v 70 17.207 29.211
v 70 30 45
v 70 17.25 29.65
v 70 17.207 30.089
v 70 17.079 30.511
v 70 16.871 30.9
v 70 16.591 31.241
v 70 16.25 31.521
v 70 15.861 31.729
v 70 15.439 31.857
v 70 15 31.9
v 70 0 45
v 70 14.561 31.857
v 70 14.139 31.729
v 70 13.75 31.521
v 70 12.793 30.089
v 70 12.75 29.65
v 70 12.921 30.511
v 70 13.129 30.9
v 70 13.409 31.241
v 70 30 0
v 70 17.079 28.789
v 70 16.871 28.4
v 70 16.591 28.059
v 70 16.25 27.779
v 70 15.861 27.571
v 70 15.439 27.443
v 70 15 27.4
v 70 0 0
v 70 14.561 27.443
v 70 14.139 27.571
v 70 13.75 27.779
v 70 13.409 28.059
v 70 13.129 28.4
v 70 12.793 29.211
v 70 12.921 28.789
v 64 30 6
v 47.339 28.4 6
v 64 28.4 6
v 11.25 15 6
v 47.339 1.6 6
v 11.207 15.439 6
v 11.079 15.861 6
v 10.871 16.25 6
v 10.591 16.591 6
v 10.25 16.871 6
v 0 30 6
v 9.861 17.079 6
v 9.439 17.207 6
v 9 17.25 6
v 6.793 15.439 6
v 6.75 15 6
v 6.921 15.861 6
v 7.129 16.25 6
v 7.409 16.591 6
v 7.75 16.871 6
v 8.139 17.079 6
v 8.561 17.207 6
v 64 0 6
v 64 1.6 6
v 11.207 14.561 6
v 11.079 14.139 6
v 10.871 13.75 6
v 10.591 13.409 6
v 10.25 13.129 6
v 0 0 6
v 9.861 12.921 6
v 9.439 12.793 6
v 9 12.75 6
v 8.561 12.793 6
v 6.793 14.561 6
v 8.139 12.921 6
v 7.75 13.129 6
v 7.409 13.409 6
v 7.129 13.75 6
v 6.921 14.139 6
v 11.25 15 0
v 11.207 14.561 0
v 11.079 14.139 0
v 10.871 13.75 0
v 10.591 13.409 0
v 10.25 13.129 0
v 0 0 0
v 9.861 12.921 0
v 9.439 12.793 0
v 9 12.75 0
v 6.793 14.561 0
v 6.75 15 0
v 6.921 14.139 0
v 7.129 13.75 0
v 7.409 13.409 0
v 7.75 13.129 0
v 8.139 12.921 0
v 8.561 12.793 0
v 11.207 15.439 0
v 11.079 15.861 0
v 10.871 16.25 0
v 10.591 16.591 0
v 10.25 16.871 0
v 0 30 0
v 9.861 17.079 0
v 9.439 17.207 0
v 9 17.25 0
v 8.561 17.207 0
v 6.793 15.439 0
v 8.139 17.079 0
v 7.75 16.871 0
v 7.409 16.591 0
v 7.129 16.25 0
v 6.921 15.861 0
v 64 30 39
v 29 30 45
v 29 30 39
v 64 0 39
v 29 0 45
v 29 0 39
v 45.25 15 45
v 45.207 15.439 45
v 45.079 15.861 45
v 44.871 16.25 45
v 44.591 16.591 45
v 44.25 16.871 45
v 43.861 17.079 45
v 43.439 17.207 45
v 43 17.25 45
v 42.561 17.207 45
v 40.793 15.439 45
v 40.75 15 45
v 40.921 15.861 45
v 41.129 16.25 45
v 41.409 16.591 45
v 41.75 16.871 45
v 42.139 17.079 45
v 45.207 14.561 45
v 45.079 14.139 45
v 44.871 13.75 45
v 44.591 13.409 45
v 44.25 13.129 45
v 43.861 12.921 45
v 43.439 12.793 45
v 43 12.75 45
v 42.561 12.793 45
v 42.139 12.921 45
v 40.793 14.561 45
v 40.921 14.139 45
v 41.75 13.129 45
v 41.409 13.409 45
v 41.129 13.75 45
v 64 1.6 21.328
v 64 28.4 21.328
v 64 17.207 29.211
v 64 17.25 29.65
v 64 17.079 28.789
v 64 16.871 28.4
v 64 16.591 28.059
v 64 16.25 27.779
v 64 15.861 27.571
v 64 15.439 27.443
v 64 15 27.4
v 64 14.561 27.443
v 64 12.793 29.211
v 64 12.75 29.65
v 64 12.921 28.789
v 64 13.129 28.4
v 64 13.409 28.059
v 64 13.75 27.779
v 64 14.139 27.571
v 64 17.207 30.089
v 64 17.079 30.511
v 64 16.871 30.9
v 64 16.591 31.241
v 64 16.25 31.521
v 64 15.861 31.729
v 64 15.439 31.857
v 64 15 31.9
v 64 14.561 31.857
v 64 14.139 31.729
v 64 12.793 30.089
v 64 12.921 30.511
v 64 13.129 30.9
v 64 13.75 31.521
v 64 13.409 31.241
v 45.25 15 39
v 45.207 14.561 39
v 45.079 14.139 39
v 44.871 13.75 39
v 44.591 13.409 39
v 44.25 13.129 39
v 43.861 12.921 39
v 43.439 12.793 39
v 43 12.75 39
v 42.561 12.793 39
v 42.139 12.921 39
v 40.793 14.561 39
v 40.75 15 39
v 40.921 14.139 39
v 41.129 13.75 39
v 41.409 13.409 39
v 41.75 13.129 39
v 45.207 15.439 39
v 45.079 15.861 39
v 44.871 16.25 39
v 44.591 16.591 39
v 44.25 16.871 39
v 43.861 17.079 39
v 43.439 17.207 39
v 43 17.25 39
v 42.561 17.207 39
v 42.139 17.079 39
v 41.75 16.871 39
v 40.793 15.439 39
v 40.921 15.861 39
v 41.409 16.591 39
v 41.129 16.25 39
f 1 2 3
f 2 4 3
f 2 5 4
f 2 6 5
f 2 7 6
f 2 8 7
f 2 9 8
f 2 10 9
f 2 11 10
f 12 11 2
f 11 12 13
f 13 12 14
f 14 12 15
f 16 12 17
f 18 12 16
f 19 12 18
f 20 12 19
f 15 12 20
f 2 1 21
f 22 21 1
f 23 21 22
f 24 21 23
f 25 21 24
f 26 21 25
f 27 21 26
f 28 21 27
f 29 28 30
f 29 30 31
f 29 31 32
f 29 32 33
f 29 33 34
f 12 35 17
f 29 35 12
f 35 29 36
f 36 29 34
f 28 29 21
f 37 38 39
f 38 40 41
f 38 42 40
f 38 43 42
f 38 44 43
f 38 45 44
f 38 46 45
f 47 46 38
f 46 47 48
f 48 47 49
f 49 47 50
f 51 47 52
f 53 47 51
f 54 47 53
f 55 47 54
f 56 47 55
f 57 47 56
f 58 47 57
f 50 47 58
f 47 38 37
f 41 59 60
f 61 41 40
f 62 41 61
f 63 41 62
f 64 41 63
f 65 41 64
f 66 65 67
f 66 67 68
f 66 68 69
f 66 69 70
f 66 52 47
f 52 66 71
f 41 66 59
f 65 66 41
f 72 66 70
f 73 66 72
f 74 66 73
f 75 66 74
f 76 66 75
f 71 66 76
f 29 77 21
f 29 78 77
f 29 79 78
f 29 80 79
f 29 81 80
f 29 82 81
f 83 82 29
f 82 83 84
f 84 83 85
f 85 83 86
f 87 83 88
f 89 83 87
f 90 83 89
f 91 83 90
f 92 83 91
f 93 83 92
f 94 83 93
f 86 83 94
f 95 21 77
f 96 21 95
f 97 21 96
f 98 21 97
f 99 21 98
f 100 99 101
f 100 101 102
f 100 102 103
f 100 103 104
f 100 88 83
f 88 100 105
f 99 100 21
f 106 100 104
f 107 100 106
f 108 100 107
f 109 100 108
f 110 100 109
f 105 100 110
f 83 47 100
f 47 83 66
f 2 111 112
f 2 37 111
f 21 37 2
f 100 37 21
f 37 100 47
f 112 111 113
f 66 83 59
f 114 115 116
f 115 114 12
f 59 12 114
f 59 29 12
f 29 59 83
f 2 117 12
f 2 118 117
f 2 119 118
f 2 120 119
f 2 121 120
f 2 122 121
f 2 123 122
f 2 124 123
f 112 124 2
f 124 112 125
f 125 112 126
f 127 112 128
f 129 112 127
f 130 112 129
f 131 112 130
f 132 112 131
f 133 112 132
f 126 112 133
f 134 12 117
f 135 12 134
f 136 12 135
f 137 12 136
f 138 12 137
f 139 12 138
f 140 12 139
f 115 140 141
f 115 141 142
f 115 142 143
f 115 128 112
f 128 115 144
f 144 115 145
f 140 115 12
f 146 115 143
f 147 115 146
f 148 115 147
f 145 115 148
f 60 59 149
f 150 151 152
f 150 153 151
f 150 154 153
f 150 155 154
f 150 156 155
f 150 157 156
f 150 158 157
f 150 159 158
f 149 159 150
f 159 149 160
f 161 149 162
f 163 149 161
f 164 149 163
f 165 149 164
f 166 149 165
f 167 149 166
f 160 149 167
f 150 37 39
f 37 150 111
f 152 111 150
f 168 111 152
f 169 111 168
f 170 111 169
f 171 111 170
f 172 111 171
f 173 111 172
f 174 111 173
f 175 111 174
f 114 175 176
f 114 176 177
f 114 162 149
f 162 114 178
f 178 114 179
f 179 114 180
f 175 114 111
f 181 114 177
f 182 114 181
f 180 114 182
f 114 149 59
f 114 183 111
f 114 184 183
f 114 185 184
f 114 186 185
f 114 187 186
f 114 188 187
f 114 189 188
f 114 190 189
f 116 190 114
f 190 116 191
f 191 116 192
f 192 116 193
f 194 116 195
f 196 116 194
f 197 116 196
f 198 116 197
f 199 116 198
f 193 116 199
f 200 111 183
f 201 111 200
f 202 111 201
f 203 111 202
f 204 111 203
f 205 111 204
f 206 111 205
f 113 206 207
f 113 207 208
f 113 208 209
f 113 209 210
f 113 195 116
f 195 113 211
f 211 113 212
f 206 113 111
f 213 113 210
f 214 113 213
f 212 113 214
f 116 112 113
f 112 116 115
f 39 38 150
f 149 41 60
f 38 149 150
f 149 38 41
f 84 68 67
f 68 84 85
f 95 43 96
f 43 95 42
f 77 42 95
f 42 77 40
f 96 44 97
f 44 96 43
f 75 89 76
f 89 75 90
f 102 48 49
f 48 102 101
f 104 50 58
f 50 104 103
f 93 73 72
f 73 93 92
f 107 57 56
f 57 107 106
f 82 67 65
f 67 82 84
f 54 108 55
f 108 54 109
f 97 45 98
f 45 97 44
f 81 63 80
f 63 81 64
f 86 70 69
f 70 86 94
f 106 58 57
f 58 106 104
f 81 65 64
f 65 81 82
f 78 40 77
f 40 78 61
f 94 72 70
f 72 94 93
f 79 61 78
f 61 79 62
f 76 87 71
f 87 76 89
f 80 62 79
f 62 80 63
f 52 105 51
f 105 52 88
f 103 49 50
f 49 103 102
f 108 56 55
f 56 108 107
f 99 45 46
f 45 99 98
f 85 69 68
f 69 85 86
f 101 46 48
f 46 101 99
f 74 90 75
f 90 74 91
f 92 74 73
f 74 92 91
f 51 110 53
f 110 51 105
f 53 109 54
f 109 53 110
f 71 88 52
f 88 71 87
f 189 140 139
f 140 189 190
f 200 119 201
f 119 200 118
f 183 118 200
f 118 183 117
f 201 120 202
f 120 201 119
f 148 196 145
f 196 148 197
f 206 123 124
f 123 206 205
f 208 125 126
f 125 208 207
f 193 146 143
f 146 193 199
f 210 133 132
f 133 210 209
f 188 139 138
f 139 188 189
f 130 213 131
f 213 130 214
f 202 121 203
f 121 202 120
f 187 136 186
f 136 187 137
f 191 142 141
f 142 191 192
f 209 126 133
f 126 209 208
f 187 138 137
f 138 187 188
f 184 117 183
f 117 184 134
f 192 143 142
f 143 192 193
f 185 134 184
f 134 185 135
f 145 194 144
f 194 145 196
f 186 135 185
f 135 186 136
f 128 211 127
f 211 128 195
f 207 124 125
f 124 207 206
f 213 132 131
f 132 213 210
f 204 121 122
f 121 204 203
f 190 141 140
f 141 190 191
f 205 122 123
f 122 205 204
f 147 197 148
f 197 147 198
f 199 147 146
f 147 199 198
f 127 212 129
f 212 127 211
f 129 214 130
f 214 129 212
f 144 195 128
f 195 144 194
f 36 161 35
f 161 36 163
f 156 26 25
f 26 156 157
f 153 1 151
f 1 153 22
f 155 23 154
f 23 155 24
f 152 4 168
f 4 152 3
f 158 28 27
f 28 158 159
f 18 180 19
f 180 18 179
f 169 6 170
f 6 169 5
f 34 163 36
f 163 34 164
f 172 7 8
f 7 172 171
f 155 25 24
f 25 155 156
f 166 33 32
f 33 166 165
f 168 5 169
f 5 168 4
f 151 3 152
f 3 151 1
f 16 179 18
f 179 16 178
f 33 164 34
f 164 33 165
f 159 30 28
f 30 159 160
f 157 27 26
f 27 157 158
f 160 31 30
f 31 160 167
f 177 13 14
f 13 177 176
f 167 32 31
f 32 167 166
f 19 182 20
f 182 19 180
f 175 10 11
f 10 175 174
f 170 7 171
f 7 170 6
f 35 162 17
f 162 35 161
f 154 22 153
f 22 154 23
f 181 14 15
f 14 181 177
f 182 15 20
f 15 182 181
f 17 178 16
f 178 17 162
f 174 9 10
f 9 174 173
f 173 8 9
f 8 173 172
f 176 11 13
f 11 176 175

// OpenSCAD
$fn = 32;

// ----------------------------------------------------------------------
// Z-bracket: 70 x 30 x 45 mm
// ----------------------------------------------------------------------

// --- parameters (mm) ---
foot_len = 70;            // lower foot length, X
top_len = 35;             // upper foot length, X
depth = 30;               // bracket width, Y
step_h = 45;              // overall rise, Z
plate_t = 6;              // plate thickness
hole_d = 4.5;             // clearance for M4
rib_len = 18.4;           // gusset leg
rib_sink = 1.6;           // gusset overlap into the plates

module hole_z(px, py, z0) {
  translate([px, py, z0 - 2.5]) cylinder(h = plate_t + 5, d = hole_d);
}
module hole_x(py, pz) {
  translate([-2.5, py, pz]) rotate([0, 90, 0]) cylinder(h = plate_t + 5, d = hole_d);
}
module gusset(x0) {
  translate([x0, depth - rib_sink, 0])
    rotate([90, 0, 0])
      linear_extrude(height = depth - 2 * rib_sink)
        polygon(points = [[rib_sink, plate_t - rib_sink],
                          [rib_sink, plate_t - rib_sink + rib_len],
                          [-rib_len, plate_t - rib_sink]]);
}

difference() {
  union() {
    cube([foot_len, depth, plate_t]);
    /* web, overlapping the lower foot */
    translate([foot_len - plate_t, 0, 0]) cube([plate_t, depth, step_h]);
    /* upper foot, sunk into the web */
    translate([foot_len - plate_t - top_len, 0, step_h - plate_t]) cube([top_len + plate_t, depth, plate_t]);
    gusset(foot_len - plate_t);
  }
  hole_z(9, 15, 0);
  translate([foot_len - plate_t - 21, 0, 0]) hole_z(0, 15, step_h - plate_t);
  translate([foot_len - plate_t, 0, 0]) hole_x(15, 29.65);
}
